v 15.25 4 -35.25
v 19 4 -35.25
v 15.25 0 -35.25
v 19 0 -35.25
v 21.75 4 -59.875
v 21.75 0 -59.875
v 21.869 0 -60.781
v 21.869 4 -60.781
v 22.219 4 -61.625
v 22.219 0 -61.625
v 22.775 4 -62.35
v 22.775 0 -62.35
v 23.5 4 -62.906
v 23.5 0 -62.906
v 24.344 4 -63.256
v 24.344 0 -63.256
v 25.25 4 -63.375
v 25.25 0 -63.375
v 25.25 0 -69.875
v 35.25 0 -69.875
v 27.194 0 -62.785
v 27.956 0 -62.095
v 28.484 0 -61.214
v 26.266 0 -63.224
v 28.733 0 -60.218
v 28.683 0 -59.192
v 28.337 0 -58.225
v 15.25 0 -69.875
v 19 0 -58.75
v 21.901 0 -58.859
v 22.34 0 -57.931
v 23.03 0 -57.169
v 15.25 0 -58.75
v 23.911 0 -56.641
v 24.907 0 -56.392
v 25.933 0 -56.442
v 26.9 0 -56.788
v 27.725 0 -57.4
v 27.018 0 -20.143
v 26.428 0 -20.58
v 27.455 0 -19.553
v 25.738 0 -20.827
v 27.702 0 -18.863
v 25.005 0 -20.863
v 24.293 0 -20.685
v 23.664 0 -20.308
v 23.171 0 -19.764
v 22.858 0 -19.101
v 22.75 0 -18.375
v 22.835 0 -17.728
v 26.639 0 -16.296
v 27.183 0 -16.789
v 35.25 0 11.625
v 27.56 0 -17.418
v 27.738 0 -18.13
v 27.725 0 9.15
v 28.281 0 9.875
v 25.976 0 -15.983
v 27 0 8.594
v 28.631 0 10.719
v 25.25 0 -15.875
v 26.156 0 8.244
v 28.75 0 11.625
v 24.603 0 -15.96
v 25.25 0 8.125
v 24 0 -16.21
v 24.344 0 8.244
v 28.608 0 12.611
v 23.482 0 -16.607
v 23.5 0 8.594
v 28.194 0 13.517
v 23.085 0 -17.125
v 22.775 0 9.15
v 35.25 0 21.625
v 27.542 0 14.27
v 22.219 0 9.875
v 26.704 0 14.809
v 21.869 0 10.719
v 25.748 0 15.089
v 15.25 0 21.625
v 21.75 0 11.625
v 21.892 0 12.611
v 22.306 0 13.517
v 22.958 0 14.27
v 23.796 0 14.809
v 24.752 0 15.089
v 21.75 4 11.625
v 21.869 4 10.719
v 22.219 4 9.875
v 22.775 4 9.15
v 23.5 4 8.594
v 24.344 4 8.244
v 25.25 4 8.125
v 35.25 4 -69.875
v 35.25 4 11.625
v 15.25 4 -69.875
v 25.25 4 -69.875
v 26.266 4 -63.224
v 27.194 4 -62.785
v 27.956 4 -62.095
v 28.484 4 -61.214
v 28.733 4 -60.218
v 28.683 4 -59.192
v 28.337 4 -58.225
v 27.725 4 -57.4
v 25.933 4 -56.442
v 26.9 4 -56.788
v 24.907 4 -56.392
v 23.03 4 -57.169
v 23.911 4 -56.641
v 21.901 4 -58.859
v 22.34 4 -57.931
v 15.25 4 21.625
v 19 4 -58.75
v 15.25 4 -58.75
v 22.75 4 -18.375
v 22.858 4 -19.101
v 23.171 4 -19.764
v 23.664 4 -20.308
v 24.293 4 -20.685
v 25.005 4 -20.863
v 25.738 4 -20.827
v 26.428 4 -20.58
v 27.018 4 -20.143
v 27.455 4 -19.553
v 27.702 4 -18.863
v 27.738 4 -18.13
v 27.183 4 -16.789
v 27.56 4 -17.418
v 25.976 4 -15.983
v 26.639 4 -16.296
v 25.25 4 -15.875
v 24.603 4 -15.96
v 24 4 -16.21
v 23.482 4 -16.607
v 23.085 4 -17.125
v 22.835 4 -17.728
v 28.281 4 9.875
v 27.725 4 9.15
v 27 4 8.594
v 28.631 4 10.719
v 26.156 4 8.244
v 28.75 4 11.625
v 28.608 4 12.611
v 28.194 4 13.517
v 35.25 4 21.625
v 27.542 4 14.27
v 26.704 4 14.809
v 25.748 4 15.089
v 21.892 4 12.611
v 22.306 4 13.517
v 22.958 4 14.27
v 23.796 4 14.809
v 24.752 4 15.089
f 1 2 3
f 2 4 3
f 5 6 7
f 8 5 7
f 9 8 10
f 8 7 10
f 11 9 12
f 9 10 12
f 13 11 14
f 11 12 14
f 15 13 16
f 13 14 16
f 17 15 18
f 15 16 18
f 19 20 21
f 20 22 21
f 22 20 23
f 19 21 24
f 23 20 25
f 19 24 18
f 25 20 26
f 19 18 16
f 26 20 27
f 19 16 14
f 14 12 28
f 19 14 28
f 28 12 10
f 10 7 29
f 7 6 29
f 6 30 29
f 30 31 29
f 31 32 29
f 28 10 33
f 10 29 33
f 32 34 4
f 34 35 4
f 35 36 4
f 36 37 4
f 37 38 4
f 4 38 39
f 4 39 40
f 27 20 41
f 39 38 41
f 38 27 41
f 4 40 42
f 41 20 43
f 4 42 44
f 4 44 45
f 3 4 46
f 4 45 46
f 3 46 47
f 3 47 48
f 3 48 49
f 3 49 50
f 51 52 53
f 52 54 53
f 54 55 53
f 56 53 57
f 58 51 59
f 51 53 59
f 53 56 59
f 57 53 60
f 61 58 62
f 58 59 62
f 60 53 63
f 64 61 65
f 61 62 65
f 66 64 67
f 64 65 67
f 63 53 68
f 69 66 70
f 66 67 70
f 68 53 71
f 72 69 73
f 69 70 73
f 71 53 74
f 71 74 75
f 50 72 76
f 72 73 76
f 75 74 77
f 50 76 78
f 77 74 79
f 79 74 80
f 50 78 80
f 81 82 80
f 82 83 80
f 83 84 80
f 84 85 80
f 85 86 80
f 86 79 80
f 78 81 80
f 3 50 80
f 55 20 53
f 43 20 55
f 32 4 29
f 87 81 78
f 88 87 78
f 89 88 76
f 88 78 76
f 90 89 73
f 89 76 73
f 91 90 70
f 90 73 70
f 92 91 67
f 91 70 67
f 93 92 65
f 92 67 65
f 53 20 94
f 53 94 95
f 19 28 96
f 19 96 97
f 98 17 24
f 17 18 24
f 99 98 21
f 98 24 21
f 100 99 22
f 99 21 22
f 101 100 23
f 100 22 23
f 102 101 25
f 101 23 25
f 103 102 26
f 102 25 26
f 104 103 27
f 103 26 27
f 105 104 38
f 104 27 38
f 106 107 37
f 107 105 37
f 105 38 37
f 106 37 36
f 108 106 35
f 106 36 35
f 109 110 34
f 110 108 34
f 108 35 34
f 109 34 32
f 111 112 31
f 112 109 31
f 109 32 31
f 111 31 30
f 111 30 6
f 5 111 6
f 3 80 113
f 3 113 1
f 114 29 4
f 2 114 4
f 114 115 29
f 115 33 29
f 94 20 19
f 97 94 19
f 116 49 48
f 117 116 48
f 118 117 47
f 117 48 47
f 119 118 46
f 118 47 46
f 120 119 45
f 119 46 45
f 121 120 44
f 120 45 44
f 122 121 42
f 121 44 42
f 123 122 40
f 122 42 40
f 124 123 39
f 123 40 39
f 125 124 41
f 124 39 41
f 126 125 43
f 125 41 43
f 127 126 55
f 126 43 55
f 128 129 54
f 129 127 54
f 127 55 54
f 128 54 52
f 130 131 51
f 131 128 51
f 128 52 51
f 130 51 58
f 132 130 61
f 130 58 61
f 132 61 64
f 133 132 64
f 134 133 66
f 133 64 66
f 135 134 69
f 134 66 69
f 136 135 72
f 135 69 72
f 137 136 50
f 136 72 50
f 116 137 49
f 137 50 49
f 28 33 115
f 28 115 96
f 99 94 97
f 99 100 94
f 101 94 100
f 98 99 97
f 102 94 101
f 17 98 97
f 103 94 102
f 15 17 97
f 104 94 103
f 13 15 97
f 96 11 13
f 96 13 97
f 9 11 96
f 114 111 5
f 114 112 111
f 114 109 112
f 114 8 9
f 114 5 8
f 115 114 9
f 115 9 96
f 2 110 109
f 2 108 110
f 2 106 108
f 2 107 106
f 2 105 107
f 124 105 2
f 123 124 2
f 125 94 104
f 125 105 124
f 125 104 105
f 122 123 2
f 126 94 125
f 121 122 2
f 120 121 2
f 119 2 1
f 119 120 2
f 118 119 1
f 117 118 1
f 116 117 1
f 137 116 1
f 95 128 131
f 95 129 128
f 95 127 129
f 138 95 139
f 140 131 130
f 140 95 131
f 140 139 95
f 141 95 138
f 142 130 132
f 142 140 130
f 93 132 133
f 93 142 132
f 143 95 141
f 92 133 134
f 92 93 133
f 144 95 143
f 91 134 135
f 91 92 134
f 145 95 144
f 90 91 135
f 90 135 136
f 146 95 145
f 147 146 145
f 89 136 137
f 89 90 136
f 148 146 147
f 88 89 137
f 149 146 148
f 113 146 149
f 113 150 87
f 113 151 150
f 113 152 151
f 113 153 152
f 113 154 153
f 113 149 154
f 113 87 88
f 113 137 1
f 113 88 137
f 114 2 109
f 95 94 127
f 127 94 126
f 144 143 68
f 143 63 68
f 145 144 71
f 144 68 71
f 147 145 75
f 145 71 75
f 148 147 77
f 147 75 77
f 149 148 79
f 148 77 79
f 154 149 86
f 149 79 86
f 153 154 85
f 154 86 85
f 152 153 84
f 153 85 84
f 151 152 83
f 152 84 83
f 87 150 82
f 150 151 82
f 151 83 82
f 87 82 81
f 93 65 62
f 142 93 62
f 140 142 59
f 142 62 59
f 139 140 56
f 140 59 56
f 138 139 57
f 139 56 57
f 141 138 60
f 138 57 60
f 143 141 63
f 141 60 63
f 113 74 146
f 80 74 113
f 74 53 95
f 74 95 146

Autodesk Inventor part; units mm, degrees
ref_plane "YZ Plane" through (0, 0, 0) normal (1, 0, 0) x (0, 1, 0)
ref_plane "XZ Plane" through (0, 0, 0) normal (0, 1, 0) x (-1, 0, 0)
ref_plane "XY Plane" through (0, 0, 0) normal (0, 0, 1) x (1, 0, 0)
sketch "Sketch1" plane through (0, 0, 0) normal (0, 1, 0) x (-1, 0, 0)
  circle A0 centre (0, 0) radius 10.5
  line L0 (0, 0) -> (0, -23.5)
  circle A1 centre (0, -23.5) radius 5.25
  line L1 (0, -23.5) -> (0, -35.25)
  line L2 (-14, -35.25) -> (-14, -58.75)
  line L3 (-14, -58.75) -> (-19, -58.75)
  line L4 (-19, -58.75) -> (-19, -35.25)
  line L5 (-35.25, 21.625) -> (35.25, 21.625) construction
  line L6 (35.25, 21.625) -> (25.25, 21.625)
  line L7 (-35.25, -69.875) -> (-35.25, 21.625)
  line L8 (-35.25, 21.625) -> (-35.25, 11.625)
  line L9 (-35.25, 11.625) -> (-25.25, 11.625)
  circle A2 centre (-25.25, 11.625) radius 3.5
  line L10 (35.25, 21.625) -> (25.25, 21.625)
  line L11 (25.25, 21.625) -> (25.25, 11.625)
  circle A3 centre (25.25, 11.625) radius 3.5
  line L12 (35.25, -69.875) -> (25.25, -69.875)
  line L13 (25.25, -69.875) -> (25.25, -59.875)
  circle A4 centre (25.25, -59.875) radius 3.5
  line L14 (-35.25, -69.875) -> (-25.25, -69.875)
  line L15 (-25.25, -69.875) -> (-25.25, -59.875)
  circle A5 centre (-25.25, -59.875) radius 3.5
  line L16 (-25.25, 11.625) -> (-25.25, -18.375)
  circle A6 centre (-25.25, -18.375) radius 2.5
  circle A7 centre (25.25, -29.875) radius 2.5
  line L17 (-19, -35.25) -> (-14, -35.25)
  line L18 (-35.25, 21.625) -> (-15.25, 21.625)
  line L19 (35.25, 21.625) -> (35.25, 11.625)
  line L20 (35.25, -58.75) -> (35.25, -69.875)
  line L21 (35.25, -69.875) -> (25.25, -69.875)
  line L22 (-15.25, -69.875) -> (-35.25, -69.875)
  line L23 (-35.25, 21.625) -> (-15.25, 21.625)
  line L24 (25.25, 21.625) -> (35.25, 21.625)
  line L25 (-35.25, 21.625) -> (-15.25, 21.625)
  line L26 (25.25, 21.625) -> (35.25, 21.625)
  line L27 (25.25, -59.875) -> (25.25, -56.375)
  line L28 (25.25, -32.375) -> (25.25, -29.875)
  line L29 (-15.25, 21.625) -> (-15.25, -35.25)
  line L30 (-15.25, -58.75) -> (-15.25, -69.875)
  dimension "d53" = 7
  dimension "d63" = 5
  dimension "d0" = 21
  dimension "d1" = 23.5
  dimension "d2" = 10.5
  dimension "d3" = 11.75
  dimension "d5" = 23.5
  dimension "d6" = 5
  dimension "d7" = 23.5
  dimension "d9" = 70.5
  dimension "d41" = 70.5
  dimension "d42" = 91.5
  dimension "d43" = 10
  dimension "d44" = 10
  dimension "d45" = 7
  dimension "d46" = 10
  dimension "d47" = 10
  dimension "d48" = 90
  dimension "d50" = 7
  dimension "d51" = 10
  dimension "d52" = 10
  dimension "d54" = 10
  dimension "d55" = 10
  dimension "d56" = 7
  dimension "d60" = 30
  dimension "d61" = 30
  dimension "d62" = 5
  dimension "d65" = 20
extrude "Extrusion1" add sketch "Sketch1" along normal blind 4 contours L17 L4 L3 L30 L22 L14 L7 L18 L29
properties part number "m"
